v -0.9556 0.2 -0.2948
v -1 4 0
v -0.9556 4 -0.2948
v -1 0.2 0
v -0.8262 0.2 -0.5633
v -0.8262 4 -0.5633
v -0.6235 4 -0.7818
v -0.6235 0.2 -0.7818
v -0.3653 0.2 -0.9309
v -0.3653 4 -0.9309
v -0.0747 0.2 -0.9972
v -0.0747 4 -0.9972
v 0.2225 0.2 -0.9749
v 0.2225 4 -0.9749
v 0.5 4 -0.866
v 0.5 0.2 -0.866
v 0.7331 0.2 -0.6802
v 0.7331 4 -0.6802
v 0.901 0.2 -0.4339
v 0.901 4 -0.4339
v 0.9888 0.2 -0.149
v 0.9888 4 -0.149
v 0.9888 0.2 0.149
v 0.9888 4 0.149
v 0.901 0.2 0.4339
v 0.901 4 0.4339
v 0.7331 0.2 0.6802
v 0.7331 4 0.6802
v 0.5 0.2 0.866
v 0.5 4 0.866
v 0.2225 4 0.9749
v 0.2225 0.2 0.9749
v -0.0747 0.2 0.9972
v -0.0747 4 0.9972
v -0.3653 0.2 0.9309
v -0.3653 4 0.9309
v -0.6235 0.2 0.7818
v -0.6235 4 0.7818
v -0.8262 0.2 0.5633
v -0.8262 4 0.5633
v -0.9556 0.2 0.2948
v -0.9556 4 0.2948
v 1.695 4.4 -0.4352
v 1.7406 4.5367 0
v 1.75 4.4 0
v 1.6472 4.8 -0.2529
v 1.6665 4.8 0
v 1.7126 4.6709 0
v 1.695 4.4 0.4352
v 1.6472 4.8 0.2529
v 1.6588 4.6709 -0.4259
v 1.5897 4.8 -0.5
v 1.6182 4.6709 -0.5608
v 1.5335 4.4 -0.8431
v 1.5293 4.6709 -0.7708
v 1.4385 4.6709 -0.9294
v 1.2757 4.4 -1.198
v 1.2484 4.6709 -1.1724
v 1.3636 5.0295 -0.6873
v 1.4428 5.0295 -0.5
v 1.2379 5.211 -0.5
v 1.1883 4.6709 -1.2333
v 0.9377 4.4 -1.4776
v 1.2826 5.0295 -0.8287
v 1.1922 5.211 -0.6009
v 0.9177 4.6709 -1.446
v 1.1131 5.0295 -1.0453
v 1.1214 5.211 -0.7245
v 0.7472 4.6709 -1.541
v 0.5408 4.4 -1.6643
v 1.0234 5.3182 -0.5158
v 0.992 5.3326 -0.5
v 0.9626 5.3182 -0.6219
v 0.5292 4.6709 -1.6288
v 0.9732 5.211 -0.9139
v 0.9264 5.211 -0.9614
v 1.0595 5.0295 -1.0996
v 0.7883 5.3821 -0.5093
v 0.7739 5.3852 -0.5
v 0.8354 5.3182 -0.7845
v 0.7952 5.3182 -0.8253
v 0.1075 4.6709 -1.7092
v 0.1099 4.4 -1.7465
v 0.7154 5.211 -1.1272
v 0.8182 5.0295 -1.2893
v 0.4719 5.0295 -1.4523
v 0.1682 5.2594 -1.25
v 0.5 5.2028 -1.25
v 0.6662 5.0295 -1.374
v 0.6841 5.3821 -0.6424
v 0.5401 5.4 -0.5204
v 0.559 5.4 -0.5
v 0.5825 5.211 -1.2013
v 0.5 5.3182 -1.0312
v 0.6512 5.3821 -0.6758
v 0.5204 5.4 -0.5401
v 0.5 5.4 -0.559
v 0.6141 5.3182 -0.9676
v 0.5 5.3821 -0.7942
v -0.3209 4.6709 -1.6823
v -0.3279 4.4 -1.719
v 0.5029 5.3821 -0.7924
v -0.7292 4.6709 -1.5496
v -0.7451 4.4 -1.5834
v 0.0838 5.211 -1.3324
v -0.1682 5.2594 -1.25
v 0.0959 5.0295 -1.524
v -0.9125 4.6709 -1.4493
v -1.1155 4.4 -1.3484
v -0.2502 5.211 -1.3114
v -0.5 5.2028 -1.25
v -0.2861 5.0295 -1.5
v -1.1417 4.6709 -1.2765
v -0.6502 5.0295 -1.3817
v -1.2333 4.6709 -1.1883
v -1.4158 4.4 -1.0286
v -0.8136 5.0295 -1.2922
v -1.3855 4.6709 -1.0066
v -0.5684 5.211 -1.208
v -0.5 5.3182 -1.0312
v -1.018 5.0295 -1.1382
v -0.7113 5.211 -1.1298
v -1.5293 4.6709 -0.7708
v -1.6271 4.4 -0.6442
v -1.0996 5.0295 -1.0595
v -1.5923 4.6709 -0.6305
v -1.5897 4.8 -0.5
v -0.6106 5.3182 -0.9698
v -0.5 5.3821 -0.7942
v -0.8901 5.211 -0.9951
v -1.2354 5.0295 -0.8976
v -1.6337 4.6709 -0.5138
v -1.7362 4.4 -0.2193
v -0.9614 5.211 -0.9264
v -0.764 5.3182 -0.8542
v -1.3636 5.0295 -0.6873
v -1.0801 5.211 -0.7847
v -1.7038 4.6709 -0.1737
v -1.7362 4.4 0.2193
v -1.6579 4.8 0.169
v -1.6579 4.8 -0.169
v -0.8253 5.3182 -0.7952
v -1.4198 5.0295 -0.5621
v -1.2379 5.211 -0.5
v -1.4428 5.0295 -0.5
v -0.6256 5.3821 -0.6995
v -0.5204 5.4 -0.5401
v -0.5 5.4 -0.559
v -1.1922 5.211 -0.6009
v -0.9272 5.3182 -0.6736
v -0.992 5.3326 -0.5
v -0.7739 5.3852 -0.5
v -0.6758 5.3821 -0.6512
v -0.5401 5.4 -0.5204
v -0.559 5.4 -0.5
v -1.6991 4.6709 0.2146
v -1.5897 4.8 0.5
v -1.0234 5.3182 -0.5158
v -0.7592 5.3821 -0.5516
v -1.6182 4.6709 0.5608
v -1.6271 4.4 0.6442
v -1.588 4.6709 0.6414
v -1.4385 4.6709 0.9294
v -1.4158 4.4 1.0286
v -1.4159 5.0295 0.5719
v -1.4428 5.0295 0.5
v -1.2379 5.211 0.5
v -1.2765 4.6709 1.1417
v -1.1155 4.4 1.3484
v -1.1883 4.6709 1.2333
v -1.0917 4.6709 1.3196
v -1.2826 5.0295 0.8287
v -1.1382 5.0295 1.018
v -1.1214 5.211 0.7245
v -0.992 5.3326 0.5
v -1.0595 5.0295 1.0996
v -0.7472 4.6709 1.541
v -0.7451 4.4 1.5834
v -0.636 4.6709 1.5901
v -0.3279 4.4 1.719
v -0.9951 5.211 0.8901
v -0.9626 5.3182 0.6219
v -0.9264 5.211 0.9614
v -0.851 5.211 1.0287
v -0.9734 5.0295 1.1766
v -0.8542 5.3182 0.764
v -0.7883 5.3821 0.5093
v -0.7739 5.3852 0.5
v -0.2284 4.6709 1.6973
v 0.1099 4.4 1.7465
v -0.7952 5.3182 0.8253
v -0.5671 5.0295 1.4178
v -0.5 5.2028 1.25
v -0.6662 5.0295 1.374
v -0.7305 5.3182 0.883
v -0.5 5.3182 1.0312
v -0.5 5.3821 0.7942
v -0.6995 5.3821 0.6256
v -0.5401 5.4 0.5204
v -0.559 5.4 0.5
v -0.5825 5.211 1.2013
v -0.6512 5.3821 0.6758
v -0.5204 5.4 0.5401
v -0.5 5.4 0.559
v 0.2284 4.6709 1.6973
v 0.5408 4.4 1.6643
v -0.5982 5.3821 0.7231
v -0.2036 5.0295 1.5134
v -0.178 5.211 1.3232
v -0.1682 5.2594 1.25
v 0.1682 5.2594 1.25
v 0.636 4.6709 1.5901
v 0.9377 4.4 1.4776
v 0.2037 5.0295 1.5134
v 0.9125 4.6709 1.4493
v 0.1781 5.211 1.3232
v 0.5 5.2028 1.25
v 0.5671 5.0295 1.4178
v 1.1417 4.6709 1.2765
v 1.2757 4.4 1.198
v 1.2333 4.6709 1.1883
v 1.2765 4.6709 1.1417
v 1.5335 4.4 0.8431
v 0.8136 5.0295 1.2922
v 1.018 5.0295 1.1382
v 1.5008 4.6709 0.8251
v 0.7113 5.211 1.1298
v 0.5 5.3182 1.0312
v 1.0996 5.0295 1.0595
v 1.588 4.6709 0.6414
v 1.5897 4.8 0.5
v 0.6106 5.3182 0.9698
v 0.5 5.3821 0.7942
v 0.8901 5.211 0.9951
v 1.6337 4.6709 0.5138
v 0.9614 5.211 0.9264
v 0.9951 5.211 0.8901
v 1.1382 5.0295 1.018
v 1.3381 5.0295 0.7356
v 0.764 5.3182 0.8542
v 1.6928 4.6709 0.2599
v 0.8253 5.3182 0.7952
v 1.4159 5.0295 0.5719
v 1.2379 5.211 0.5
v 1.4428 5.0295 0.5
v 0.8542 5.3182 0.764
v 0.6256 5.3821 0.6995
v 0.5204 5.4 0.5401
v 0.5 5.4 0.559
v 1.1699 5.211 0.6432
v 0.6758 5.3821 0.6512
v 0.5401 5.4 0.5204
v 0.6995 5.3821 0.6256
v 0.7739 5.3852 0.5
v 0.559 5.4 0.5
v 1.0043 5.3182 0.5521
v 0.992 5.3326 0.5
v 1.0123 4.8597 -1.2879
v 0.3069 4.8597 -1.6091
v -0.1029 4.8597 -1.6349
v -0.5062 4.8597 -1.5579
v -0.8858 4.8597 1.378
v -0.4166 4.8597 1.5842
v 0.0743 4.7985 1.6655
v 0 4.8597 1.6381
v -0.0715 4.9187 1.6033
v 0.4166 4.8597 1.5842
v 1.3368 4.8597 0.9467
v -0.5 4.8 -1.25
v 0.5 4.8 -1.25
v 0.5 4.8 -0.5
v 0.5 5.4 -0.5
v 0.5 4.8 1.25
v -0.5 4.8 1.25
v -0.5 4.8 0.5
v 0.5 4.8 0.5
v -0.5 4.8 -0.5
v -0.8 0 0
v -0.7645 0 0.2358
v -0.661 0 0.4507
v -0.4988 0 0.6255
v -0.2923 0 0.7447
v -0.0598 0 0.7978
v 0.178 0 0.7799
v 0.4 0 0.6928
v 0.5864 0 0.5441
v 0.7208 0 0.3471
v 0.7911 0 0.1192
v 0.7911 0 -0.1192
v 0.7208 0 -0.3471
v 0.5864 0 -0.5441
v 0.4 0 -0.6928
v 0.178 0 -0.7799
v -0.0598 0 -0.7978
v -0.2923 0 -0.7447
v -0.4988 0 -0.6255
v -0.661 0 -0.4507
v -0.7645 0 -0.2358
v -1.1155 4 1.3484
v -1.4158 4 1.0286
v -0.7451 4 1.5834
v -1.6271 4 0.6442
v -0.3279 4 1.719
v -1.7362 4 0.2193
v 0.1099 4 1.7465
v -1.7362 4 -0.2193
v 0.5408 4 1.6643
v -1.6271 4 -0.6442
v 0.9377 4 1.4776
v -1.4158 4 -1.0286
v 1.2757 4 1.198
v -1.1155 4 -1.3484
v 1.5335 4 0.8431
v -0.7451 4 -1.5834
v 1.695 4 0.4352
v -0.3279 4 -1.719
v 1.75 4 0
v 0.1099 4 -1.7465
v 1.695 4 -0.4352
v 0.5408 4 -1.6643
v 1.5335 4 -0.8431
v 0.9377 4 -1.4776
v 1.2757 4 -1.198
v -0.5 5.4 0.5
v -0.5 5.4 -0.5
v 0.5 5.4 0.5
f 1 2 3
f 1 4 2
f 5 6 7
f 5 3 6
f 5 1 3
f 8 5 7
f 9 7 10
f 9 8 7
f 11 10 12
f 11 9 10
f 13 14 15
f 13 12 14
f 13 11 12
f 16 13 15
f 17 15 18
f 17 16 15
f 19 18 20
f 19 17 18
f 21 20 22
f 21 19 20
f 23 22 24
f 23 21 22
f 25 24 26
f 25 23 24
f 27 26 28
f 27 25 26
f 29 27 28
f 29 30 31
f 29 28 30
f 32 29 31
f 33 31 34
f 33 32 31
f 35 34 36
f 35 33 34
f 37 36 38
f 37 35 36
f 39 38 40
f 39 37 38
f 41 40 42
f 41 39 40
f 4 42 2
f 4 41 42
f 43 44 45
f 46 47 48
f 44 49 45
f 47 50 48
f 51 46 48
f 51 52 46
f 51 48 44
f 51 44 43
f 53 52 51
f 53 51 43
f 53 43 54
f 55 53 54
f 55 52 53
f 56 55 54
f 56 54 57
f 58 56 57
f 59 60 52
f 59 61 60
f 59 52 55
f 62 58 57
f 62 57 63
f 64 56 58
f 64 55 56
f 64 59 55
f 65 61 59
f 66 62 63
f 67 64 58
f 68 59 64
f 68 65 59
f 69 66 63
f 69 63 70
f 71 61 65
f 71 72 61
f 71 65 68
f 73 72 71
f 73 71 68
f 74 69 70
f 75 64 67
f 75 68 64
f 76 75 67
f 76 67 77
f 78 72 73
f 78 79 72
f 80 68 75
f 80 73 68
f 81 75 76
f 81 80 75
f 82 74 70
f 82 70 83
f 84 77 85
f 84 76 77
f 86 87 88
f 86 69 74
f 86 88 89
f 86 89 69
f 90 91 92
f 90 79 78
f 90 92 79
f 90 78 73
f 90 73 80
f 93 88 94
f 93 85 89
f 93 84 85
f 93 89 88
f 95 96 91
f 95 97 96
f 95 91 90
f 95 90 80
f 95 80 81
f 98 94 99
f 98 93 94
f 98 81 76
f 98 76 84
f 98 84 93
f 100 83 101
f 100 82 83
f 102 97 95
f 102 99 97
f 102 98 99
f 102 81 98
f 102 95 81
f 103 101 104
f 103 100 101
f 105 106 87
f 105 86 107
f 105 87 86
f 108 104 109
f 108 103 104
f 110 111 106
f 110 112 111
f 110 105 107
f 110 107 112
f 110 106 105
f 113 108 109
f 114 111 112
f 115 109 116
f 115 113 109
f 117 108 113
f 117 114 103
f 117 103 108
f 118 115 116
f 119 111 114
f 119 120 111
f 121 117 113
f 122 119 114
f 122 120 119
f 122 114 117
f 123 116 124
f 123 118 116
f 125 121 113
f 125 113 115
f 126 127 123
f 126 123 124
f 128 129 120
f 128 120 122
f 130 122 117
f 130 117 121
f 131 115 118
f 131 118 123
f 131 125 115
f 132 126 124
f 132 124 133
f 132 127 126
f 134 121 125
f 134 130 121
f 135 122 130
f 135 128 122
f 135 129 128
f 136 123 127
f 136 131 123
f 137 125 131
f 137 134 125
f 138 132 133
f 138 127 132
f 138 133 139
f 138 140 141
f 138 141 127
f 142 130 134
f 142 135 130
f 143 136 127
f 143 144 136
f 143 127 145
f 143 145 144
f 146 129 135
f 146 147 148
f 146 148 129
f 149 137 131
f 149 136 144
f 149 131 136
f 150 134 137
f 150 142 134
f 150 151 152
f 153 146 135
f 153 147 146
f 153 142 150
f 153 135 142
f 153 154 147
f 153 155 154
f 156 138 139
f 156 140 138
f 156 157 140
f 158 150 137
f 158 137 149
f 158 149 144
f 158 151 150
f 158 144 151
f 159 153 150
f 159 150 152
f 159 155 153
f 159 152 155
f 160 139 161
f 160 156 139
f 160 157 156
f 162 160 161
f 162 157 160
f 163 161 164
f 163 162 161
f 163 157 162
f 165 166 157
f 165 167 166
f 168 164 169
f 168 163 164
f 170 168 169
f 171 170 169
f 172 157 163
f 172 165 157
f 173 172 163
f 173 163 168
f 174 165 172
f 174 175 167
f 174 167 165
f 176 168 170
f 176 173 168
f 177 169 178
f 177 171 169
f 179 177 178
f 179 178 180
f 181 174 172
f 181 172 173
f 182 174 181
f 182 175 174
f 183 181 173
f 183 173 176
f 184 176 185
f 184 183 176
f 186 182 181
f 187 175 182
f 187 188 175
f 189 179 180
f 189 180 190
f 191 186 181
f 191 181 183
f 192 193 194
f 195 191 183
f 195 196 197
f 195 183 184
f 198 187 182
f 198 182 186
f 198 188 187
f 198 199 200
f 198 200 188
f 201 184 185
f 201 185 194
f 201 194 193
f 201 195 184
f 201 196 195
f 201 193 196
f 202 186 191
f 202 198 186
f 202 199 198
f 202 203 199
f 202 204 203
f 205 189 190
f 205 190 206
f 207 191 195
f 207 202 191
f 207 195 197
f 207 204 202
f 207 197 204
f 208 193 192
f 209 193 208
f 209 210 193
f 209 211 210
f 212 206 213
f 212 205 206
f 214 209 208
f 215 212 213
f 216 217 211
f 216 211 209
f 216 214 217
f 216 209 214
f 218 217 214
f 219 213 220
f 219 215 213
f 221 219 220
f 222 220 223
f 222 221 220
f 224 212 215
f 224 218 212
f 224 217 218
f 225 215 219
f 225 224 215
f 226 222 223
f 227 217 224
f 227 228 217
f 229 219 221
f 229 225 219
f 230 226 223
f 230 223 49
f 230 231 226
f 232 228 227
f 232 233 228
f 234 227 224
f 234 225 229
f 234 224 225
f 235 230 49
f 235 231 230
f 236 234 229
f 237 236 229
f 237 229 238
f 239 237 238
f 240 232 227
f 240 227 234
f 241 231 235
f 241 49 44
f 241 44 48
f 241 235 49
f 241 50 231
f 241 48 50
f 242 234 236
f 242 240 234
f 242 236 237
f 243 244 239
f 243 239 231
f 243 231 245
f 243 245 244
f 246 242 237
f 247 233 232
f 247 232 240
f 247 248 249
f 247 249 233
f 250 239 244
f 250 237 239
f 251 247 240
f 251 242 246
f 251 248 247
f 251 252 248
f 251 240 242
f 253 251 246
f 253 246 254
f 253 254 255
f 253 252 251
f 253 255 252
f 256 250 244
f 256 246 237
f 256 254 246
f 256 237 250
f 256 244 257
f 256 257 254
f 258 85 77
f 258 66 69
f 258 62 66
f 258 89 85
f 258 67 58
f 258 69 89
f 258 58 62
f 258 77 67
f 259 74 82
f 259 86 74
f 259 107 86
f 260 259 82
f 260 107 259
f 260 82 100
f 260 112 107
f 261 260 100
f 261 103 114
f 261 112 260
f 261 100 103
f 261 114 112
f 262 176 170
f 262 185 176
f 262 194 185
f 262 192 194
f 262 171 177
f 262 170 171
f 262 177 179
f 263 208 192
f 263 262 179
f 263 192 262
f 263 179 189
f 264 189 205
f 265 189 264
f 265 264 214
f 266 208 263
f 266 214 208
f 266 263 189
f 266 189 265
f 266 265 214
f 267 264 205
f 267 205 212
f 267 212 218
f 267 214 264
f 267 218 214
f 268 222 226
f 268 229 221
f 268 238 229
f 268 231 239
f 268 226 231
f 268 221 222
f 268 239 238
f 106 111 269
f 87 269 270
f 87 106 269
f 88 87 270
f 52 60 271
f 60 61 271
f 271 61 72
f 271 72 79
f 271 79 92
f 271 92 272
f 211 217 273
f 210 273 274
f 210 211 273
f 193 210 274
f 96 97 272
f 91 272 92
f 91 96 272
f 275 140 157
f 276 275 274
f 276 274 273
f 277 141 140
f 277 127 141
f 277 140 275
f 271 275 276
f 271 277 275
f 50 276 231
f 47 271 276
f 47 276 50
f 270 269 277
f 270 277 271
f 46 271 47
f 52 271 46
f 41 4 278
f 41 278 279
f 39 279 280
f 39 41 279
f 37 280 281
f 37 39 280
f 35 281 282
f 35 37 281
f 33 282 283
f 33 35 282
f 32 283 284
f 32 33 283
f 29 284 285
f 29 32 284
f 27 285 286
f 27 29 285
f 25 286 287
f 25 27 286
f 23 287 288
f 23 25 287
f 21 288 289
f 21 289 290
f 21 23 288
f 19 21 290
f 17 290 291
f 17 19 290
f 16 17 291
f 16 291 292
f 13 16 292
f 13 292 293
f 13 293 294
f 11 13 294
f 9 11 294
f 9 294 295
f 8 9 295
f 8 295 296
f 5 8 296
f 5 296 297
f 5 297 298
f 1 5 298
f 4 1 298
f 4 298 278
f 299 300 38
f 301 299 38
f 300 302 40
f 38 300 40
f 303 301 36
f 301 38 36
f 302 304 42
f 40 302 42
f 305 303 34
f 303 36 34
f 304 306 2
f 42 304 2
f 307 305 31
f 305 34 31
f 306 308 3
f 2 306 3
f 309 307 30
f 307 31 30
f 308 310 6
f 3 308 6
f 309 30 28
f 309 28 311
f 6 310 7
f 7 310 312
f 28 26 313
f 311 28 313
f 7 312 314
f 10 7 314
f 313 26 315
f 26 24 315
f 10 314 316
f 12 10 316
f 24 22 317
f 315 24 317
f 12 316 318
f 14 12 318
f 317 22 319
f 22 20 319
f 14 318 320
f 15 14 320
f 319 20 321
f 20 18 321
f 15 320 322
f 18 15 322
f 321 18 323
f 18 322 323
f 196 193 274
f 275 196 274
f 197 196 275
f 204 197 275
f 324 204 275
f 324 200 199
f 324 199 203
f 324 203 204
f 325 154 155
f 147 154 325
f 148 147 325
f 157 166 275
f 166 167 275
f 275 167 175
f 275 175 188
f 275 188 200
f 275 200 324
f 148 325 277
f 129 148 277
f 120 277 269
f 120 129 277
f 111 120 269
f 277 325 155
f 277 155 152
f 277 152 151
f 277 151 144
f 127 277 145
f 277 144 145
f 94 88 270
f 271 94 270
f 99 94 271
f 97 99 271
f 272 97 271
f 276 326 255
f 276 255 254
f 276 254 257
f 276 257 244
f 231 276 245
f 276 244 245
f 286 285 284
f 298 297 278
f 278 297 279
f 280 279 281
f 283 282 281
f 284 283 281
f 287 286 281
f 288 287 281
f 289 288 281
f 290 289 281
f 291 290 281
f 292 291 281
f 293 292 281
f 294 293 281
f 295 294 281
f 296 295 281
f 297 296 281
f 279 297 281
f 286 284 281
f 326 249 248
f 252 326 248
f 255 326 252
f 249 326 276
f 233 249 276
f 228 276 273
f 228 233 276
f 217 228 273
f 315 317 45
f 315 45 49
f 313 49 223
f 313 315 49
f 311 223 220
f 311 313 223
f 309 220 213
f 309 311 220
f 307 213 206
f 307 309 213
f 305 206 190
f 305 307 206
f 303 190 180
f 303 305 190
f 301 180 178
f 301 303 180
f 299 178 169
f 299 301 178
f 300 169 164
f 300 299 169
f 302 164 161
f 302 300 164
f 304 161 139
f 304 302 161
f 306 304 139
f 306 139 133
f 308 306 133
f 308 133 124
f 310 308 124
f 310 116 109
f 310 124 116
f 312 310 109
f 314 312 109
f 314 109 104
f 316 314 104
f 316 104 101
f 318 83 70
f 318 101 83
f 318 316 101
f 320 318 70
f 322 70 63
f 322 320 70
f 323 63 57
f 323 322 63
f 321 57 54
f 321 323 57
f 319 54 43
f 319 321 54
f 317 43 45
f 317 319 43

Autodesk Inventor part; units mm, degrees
ref_plane "YZ Plane" through (0, 0, 0) normal (1, 0, 0) x (0, 1, 0)
ref_plane "XZ Plane" through (0, 0, 0) normal (0, 1, 0) x (-1, 0, 0)
ref_plane "XY Plane" through (0, 0, 0) normal (0, 0, 1) x (1, 0, 0)
sketch "Sketch1" plane through (0, 0, 0) normal (0, 1, 0) x (-1, 0, 0)
  circle A0 centre (0, 0) radius 1
  dimension "d0" = 2
extrude "Extrusion1" add sketch "Sketch1" along normal blind 4
sketch "Sketch2" plane through (0, 4, 0) normal (0, 1, 0) x (1, 0, 0)
  circle A0 centre (0, 0) radius 1.75
  dimension "d3" = 3.5
extrude "Extrusion2" add sketch "Sketch2" along normal blind 1.4
thread "Thread2" size "M2x0.4" class "6g" standard "ANSI Metric M Profile" full length
chamfer "Chamfer2" distance 0.2 angle 45 1 edges at (1, 0, 0)
fillet "Fillet2" radius 1 1 edges at (-1.75, 5.4, 0)
sketch "Sketch4" plane through (0, 5.4, 0) normal (0, 1, 0) x (1, 0, 0)
  line L0 (-1.758, -0.5) -> (1.758, -0.5)
  line L1 (1.758, -0.5) -> (1.758, 0.5)
  line L2 (1.758, 0.5) -> (-1.758, 0.5)
  line L3 (-1.758, 0.5) -> (-1.758, -0.5)
  line L4 (-1.758, -0.5) -> (1.758, 0.5) construction
  line L5 (1.758, -0.5) -> (-1.758, 0.5) construction
  line L6 (-0.5, -1.25) -> (-0.5, 1.25)
  line L7 (-0.5, 1.25) -> (0.5, 1.25)
  line L8 (0.5, 1.25) -> (0.5, -1.25)
  line L9 (0.5, -1.25) -> (-0.5, -1.25)
  circle A0 centre (0, 0) radius 1.75 projected
  line L10 (-0.5, -1.25) -> (0.5, 1.25) construction
  line L11 (-0.5, 1.25) -> (0.5, -1.25) construction
  dimension "d23" = 1
  dimension "d24" = 2.5
  dimension "d25" = 1
extrude "Extrusion4" cut sketch "Sketch4" against normal blind 0.6 contours L3 L2 A0 L0 | A0 L2 L6 L0 | L6 L2 L8 L0 | L0 L8 L9 L6 | A0 L2 L1 L0 | L0 L8 L2 A0 | L6 L7 L8 L2
properties part number "M3x10 Screw Nylon" material "Steel"
